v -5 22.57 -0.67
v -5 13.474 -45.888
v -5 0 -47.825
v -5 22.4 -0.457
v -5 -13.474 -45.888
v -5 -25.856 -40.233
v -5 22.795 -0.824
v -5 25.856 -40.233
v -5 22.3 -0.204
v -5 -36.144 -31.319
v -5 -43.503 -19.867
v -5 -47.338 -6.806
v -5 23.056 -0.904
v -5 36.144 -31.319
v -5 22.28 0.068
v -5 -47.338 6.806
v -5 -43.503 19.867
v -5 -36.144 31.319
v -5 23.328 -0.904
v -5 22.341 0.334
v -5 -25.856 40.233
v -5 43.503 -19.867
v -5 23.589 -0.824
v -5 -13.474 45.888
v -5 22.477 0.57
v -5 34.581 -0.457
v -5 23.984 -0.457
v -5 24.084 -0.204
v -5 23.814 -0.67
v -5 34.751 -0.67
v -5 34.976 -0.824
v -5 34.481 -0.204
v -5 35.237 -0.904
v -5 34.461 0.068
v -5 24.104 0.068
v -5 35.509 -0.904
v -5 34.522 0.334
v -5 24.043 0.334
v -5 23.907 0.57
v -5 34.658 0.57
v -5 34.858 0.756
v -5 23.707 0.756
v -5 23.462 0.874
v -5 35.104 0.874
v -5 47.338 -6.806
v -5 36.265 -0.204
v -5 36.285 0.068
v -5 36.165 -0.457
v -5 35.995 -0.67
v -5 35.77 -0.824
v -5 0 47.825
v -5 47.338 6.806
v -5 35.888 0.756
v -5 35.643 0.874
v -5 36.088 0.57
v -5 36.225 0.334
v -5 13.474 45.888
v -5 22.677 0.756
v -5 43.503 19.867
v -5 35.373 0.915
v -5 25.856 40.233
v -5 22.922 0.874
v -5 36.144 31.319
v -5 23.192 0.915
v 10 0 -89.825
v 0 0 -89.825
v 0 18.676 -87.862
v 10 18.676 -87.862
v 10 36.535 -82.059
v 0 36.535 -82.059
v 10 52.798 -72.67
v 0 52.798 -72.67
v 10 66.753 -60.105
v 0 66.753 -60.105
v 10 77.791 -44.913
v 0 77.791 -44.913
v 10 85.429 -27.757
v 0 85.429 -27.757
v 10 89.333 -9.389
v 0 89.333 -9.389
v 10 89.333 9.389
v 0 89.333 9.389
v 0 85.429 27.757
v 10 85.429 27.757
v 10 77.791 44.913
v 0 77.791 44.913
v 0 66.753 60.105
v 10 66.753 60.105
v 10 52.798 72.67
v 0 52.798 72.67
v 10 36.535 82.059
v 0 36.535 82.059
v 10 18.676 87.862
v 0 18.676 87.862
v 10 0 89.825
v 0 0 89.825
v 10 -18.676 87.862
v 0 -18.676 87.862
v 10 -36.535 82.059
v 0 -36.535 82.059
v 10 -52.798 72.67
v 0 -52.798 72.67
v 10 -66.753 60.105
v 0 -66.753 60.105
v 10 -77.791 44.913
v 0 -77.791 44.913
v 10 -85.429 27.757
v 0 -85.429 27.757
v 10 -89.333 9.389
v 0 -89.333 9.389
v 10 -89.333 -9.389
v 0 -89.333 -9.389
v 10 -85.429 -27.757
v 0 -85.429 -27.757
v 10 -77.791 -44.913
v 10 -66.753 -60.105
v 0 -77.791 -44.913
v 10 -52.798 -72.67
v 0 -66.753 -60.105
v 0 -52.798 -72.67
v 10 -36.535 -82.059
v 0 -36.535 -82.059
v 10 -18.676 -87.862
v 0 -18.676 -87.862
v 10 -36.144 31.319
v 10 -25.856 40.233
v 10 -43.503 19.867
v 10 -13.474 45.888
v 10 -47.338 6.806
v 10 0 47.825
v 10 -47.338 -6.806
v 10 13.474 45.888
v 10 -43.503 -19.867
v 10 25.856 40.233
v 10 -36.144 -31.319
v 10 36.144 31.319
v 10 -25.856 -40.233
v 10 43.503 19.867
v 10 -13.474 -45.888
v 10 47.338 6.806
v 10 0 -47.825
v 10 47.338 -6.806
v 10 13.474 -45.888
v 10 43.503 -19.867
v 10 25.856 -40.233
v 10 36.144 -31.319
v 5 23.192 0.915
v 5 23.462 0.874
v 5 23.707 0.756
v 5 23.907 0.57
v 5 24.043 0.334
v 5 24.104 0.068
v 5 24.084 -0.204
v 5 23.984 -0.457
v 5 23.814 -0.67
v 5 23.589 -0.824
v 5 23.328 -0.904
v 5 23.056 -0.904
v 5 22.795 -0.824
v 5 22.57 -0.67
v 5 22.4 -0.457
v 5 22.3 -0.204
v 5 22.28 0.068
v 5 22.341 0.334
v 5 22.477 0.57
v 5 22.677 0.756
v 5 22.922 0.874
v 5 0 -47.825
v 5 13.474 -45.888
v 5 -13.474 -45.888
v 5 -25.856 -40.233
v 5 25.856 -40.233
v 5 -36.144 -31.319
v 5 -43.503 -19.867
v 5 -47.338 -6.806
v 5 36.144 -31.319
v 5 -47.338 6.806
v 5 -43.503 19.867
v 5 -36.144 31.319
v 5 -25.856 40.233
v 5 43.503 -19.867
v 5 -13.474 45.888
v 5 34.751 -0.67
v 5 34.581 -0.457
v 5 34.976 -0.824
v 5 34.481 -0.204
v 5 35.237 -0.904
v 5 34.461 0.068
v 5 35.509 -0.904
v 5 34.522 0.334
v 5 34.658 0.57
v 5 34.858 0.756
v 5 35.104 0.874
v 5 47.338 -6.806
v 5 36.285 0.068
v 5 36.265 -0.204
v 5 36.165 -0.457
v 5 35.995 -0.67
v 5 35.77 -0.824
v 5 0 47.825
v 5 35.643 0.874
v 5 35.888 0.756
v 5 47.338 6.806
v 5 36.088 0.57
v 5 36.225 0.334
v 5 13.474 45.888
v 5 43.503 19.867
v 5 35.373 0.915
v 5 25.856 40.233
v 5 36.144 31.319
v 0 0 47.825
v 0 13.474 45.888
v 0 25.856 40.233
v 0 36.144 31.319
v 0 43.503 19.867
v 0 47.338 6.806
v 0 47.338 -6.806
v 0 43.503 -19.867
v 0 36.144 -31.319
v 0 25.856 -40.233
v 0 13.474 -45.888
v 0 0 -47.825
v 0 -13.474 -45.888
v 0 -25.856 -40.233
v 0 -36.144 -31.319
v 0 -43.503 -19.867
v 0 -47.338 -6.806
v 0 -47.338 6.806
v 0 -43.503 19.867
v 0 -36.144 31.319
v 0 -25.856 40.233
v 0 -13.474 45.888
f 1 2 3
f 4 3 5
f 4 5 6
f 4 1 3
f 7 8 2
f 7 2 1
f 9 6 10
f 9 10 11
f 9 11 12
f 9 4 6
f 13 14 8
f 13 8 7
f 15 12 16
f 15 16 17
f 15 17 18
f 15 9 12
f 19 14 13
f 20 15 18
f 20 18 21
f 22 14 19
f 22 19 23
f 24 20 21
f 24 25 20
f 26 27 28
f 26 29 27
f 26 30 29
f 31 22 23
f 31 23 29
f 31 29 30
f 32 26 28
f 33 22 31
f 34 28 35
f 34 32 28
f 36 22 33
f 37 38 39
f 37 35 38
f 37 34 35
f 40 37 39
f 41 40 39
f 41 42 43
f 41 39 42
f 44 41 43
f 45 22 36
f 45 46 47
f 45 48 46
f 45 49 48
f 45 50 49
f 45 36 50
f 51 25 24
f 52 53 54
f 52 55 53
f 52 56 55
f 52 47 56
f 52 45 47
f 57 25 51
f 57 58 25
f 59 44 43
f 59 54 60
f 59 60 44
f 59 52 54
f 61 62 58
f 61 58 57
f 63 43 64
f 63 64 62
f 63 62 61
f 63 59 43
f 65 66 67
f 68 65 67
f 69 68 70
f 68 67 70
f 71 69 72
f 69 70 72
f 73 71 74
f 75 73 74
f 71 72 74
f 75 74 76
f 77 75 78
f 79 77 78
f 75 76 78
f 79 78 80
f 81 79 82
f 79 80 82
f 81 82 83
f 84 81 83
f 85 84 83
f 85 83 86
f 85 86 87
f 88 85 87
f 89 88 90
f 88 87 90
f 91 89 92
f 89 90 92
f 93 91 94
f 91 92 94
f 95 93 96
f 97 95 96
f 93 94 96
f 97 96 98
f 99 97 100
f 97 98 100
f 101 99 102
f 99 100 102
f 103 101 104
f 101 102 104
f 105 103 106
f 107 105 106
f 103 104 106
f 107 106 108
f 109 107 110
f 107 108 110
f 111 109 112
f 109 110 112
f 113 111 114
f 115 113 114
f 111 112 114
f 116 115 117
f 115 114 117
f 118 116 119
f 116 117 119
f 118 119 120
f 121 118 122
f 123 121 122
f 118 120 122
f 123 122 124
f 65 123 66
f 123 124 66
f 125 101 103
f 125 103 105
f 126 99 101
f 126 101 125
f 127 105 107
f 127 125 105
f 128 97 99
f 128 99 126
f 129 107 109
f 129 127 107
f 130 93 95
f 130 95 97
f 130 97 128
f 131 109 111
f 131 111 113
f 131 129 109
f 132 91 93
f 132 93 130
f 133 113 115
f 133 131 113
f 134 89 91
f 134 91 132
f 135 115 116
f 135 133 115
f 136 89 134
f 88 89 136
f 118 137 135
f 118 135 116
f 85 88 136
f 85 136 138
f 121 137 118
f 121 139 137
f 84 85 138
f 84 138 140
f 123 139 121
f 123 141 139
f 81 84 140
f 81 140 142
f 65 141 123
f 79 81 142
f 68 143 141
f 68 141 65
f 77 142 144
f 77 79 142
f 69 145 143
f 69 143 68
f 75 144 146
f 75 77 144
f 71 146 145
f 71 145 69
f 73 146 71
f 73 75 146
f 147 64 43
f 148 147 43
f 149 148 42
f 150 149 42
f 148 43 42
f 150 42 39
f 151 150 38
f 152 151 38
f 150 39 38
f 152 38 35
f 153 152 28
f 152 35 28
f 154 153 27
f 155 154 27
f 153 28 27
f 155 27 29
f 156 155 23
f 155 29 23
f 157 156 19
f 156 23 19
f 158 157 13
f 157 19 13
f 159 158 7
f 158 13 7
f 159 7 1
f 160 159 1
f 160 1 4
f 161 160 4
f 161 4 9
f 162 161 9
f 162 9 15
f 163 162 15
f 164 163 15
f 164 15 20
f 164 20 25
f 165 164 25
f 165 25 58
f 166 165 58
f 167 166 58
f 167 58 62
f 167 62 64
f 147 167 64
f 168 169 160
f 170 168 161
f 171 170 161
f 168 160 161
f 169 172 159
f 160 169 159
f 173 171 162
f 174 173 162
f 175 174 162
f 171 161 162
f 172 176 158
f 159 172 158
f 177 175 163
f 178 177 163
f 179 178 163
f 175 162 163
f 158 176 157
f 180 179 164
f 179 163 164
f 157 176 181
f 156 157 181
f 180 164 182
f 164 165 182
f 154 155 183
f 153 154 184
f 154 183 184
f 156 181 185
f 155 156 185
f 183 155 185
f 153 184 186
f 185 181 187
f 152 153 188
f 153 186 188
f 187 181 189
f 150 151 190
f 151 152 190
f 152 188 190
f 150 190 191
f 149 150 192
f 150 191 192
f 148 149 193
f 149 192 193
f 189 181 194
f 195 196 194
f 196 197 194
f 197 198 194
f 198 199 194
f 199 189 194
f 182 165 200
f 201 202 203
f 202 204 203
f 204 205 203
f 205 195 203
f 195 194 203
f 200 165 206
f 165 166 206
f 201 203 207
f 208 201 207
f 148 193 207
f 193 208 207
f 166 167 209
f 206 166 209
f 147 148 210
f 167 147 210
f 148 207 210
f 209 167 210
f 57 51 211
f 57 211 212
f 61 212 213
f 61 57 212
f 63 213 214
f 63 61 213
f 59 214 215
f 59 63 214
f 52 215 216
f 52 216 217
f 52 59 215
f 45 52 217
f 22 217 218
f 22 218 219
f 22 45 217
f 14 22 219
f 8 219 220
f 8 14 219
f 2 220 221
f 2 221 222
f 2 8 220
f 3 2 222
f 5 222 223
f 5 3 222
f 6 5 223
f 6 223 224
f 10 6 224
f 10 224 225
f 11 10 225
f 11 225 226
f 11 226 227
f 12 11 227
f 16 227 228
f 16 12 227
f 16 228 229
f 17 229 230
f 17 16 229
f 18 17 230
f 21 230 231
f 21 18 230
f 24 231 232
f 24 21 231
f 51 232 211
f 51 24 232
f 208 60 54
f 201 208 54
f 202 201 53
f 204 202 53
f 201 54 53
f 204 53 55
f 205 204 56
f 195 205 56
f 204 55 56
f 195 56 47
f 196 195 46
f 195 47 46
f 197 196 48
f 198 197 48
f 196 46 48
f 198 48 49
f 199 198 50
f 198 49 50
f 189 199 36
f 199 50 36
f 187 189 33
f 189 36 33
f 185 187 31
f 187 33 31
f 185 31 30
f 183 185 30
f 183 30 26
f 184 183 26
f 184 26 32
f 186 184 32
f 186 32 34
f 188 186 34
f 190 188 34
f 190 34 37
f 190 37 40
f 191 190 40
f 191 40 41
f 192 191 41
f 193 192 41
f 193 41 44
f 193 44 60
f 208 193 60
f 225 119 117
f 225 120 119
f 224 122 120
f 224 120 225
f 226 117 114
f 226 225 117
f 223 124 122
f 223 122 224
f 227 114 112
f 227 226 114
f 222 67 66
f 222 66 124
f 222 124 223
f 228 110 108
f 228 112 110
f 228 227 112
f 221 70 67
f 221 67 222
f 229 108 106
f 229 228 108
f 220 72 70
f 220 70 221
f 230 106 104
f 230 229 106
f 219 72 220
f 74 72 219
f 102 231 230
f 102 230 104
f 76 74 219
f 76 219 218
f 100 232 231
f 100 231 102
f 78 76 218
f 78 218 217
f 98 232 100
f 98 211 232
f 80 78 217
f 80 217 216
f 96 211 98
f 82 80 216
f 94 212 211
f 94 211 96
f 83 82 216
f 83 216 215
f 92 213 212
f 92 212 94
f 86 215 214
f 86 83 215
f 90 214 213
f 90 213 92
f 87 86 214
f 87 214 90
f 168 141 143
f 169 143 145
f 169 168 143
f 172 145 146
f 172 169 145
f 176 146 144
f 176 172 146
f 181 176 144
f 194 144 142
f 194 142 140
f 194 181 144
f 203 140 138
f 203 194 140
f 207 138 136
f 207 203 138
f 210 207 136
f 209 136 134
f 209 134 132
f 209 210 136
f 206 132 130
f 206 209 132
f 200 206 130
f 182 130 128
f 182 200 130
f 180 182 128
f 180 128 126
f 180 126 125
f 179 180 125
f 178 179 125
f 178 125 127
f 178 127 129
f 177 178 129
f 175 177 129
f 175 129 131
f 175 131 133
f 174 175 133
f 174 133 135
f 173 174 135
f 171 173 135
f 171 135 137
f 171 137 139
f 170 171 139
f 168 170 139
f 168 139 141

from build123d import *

# Parameters (mm, degrees)
SKETCH1_R                   = 89.825
SKETCH1_R_2                 = 47.825
BOSS_EXTRUDE1_DEPTH         = 10
SKETCH3_R                   = 47.825
TBH_IDK_DEPTH               = 5
EXTRUSION_START             = 5
SKETCH4_R                   = 47.825
EXTRUSION_TO_FUEL_MAN_DEPTH = 5
OX_DOWNCOMER_REACH          = 129.914
OX_PROFILE_R                = 0.914623685


with BuildPart() as part:
    # Sketch1 → Boss-Extrude1 (new body)
    with BuildSketch(Plane(origin=(0, 0, 0), x_dir=(0, 0, -1), z_dir=(1, 0, 0))):
        Circle(SKETCH1_R)
        Circle(SKETCH1_R_2, mode=Mode.SUBTRACT)
    extrude(amount=BOSS_EXTRUDE1_DEPTH)

    # Sketch3 → tbh idk (add)
    with BuildSketch(Plane.ZY):
        Circle(SKETCH3_R)
    extrude(amount=-TBH_IDK_DEPTH)

    # Sketch4 → Extrusion to Fuel Man (add)
    with BuildSketch(Plane.ZY.offset(EXTRUSION_START)):
        Circle(SKETCH4_R)
    extrude(amount=-EXTRUSION_TO_FUEL_MAN_DEPTH)

    # Ox Profile → Ox Downcomer (cut, up to next)
    with BuildSketch(Plane.ZY.offset(5), mode=Mode.PRIVATE) as ox_downcomer_sk1:
        with Locations((0, 23.192029736)):
            Circle(OX_PROFILE_R)
    ox_downcomer_tool1 = extrude(ox_downcomer_sk1.sketch, amount=-OX_DOWNCOMER_REACH, mode=Mode.PRIVATE) & part.part
    # Ox Profile → Ox Downcomer (cut, up to next)
    with BuildSketch(Plane.ZY.offset(5), mode=Mode.PRIVATE) as ox_downcomer_sk2:
        with Locations((0, 35.373170264)):
            Circle(OX_PROFILE_R)
    ox_downcomer_tool2 = extrude(ox_downcomer_sk2.sketch, amount=-OX_DOWNCOMER_REACH, mode=Mode.PRIVATE) & part.part
    add(ox_downcomer_tool1.solids().sort_by_distance((-5, 23.19203, 0))[0], mode=Mode.SUBTRACT)
    add(ox_downcomer_tool2.solids().sort_by_distance((-5, 35.37317, 0))[0], mode=Mode.SUBTRACT)


solid = part.part
